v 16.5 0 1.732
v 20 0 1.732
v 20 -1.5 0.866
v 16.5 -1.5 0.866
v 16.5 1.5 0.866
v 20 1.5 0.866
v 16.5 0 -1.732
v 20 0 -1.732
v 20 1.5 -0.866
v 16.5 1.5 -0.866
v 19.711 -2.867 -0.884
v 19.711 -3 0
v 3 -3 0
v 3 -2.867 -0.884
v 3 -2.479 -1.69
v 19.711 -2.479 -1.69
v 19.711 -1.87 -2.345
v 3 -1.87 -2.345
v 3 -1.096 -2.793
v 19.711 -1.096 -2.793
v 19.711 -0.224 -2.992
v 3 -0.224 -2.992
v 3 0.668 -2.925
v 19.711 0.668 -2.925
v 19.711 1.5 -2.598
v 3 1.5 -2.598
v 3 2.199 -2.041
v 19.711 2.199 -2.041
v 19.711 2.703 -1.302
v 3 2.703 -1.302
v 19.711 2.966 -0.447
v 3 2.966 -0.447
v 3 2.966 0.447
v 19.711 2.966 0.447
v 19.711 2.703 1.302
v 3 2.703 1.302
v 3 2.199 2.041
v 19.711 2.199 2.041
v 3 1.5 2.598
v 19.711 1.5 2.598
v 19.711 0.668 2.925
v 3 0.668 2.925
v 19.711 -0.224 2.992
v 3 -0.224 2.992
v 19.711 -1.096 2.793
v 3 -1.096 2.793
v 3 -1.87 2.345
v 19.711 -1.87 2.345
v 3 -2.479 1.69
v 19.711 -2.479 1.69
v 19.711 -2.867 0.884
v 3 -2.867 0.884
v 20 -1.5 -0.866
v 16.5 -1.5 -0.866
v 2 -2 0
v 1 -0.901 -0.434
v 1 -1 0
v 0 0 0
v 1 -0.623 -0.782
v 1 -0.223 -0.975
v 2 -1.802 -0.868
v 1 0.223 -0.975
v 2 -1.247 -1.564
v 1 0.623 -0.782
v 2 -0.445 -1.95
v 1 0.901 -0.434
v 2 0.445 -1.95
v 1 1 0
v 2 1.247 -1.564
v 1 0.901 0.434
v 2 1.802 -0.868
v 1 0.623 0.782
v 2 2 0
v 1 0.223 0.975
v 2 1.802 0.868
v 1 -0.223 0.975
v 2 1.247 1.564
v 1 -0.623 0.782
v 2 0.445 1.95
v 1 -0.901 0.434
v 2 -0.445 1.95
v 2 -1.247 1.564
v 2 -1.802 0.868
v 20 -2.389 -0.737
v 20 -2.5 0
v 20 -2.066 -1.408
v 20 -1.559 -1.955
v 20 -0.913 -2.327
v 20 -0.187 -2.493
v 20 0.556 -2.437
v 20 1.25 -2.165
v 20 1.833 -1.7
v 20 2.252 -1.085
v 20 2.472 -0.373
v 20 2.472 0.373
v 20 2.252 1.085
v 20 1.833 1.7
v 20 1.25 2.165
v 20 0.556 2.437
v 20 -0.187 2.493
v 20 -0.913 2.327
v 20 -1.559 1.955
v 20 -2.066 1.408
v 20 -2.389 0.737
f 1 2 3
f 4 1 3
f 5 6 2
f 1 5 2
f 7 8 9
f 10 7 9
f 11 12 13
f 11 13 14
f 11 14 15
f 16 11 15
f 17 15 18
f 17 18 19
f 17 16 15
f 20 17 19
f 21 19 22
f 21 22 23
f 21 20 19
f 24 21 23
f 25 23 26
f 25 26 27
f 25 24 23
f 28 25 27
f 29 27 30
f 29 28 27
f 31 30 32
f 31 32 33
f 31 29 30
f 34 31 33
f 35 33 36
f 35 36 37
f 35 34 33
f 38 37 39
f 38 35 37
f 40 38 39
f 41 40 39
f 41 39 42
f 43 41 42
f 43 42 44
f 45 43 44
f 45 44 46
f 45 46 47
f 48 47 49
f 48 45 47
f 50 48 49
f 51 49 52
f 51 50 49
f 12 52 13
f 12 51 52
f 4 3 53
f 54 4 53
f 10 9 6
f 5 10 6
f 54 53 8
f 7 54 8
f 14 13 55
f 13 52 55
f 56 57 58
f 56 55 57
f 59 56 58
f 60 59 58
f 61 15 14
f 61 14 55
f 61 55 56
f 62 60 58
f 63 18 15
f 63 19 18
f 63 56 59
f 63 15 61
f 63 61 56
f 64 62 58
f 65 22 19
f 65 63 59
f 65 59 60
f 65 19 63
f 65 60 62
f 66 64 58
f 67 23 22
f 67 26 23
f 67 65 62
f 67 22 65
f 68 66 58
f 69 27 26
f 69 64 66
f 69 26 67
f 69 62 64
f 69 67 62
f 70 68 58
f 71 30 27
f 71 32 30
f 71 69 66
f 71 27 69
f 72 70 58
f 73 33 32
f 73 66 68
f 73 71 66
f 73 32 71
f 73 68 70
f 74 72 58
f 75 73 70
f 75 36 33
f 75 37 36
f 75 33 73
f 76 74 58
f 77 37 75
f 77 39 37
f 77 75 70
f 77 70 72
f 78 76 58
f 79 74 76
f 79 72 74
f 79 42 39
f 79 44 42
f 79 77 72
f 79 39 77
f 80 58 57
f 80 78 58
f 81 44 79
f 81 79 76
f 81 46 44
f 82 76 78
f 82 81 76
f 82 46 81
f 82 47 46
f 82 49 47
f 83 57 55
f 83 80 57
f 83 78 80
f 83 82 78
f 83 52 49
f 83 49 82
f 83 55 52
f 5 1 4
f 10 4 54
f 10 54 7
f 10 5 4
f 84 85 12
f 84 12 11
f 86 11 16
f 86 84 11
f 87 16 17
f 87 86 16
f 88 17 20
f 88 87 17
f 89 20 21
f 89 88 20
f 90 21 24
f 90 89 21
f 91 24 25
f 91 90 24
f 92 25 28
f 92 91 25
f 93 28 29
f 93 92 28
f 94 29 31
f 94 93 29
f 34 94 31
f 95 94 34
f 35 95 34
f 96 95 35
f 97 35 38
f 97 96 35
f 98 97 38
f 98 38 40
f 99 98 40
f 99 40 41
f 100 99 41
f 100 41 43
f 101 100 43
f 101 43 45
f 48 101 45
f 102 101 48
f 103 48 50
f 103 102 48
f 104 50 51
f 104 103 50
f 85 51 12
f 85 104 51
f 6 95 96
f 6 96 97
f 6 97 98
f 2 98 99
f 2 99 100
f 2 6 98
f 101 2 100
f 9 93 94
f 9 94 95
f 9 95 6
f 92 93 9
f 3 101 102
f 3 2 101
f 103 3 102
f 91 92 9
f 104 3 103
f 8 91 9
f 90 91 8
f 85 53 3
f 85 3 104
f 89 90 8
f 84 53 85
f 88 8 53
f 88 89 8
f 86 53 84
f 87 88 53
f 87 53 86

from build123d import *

# Parameters (mm, degrees)
CUT_EXTRUDE1_DEPTH = 3.5
CHAMFER1_SIZE      = 0.288675135
CHAMFER1_SIZE2     = 0.5


with BuildPart() as part:
    # Sketch1 → Revolve1 (revolve)
    with BuildSketch(Plane.XY, mode=Mode.PRIVATE) as revolve1_sk:
        Polygon((0, 0), (3, 3), (20, 3), (20, 0), align=None)
    revolve(revolve1_sk.sketch.rotate(Axis((0, 0, 0), (1, 0, 0)), 180), axis=Axis((0, 0, 0), (1, 0, 0)))

    # Sketch2 → Cut-Extrude1 (cut)
    with BuildSketch(Plane(origin=(20, 0, 0), x_dir=(0, 0, -1), z_dir=(1, 0, 0))):
        Polygon((1.732050808, 0), (0.866025404, 1.5), (-0.866025404, 1.5), (-1.732050808, 0), (-0.866025404, -1.5), (0.866025404, -1.5), align=None)
    extrude(amount=-CUT_EXTRUDE1_DEPTH, mode=Mode.SUBTRACT)

    # Chamfer1
    chamfer1_edges = [part.edges().sort_by_distance(p)[0] for p in [
        (20, 3, 0),
    ]]
    chamfer1_side = [part.faces().sort_by_distance(p)[0] for p in [
        (11.5, 3, 0),
    ]]
    chamfer(chamfer1_edges, length=CHAMFER1_SIZE, length2=CHAMFER1_SIZE2, reference=chamfer1_side[0])


solid = part.part
